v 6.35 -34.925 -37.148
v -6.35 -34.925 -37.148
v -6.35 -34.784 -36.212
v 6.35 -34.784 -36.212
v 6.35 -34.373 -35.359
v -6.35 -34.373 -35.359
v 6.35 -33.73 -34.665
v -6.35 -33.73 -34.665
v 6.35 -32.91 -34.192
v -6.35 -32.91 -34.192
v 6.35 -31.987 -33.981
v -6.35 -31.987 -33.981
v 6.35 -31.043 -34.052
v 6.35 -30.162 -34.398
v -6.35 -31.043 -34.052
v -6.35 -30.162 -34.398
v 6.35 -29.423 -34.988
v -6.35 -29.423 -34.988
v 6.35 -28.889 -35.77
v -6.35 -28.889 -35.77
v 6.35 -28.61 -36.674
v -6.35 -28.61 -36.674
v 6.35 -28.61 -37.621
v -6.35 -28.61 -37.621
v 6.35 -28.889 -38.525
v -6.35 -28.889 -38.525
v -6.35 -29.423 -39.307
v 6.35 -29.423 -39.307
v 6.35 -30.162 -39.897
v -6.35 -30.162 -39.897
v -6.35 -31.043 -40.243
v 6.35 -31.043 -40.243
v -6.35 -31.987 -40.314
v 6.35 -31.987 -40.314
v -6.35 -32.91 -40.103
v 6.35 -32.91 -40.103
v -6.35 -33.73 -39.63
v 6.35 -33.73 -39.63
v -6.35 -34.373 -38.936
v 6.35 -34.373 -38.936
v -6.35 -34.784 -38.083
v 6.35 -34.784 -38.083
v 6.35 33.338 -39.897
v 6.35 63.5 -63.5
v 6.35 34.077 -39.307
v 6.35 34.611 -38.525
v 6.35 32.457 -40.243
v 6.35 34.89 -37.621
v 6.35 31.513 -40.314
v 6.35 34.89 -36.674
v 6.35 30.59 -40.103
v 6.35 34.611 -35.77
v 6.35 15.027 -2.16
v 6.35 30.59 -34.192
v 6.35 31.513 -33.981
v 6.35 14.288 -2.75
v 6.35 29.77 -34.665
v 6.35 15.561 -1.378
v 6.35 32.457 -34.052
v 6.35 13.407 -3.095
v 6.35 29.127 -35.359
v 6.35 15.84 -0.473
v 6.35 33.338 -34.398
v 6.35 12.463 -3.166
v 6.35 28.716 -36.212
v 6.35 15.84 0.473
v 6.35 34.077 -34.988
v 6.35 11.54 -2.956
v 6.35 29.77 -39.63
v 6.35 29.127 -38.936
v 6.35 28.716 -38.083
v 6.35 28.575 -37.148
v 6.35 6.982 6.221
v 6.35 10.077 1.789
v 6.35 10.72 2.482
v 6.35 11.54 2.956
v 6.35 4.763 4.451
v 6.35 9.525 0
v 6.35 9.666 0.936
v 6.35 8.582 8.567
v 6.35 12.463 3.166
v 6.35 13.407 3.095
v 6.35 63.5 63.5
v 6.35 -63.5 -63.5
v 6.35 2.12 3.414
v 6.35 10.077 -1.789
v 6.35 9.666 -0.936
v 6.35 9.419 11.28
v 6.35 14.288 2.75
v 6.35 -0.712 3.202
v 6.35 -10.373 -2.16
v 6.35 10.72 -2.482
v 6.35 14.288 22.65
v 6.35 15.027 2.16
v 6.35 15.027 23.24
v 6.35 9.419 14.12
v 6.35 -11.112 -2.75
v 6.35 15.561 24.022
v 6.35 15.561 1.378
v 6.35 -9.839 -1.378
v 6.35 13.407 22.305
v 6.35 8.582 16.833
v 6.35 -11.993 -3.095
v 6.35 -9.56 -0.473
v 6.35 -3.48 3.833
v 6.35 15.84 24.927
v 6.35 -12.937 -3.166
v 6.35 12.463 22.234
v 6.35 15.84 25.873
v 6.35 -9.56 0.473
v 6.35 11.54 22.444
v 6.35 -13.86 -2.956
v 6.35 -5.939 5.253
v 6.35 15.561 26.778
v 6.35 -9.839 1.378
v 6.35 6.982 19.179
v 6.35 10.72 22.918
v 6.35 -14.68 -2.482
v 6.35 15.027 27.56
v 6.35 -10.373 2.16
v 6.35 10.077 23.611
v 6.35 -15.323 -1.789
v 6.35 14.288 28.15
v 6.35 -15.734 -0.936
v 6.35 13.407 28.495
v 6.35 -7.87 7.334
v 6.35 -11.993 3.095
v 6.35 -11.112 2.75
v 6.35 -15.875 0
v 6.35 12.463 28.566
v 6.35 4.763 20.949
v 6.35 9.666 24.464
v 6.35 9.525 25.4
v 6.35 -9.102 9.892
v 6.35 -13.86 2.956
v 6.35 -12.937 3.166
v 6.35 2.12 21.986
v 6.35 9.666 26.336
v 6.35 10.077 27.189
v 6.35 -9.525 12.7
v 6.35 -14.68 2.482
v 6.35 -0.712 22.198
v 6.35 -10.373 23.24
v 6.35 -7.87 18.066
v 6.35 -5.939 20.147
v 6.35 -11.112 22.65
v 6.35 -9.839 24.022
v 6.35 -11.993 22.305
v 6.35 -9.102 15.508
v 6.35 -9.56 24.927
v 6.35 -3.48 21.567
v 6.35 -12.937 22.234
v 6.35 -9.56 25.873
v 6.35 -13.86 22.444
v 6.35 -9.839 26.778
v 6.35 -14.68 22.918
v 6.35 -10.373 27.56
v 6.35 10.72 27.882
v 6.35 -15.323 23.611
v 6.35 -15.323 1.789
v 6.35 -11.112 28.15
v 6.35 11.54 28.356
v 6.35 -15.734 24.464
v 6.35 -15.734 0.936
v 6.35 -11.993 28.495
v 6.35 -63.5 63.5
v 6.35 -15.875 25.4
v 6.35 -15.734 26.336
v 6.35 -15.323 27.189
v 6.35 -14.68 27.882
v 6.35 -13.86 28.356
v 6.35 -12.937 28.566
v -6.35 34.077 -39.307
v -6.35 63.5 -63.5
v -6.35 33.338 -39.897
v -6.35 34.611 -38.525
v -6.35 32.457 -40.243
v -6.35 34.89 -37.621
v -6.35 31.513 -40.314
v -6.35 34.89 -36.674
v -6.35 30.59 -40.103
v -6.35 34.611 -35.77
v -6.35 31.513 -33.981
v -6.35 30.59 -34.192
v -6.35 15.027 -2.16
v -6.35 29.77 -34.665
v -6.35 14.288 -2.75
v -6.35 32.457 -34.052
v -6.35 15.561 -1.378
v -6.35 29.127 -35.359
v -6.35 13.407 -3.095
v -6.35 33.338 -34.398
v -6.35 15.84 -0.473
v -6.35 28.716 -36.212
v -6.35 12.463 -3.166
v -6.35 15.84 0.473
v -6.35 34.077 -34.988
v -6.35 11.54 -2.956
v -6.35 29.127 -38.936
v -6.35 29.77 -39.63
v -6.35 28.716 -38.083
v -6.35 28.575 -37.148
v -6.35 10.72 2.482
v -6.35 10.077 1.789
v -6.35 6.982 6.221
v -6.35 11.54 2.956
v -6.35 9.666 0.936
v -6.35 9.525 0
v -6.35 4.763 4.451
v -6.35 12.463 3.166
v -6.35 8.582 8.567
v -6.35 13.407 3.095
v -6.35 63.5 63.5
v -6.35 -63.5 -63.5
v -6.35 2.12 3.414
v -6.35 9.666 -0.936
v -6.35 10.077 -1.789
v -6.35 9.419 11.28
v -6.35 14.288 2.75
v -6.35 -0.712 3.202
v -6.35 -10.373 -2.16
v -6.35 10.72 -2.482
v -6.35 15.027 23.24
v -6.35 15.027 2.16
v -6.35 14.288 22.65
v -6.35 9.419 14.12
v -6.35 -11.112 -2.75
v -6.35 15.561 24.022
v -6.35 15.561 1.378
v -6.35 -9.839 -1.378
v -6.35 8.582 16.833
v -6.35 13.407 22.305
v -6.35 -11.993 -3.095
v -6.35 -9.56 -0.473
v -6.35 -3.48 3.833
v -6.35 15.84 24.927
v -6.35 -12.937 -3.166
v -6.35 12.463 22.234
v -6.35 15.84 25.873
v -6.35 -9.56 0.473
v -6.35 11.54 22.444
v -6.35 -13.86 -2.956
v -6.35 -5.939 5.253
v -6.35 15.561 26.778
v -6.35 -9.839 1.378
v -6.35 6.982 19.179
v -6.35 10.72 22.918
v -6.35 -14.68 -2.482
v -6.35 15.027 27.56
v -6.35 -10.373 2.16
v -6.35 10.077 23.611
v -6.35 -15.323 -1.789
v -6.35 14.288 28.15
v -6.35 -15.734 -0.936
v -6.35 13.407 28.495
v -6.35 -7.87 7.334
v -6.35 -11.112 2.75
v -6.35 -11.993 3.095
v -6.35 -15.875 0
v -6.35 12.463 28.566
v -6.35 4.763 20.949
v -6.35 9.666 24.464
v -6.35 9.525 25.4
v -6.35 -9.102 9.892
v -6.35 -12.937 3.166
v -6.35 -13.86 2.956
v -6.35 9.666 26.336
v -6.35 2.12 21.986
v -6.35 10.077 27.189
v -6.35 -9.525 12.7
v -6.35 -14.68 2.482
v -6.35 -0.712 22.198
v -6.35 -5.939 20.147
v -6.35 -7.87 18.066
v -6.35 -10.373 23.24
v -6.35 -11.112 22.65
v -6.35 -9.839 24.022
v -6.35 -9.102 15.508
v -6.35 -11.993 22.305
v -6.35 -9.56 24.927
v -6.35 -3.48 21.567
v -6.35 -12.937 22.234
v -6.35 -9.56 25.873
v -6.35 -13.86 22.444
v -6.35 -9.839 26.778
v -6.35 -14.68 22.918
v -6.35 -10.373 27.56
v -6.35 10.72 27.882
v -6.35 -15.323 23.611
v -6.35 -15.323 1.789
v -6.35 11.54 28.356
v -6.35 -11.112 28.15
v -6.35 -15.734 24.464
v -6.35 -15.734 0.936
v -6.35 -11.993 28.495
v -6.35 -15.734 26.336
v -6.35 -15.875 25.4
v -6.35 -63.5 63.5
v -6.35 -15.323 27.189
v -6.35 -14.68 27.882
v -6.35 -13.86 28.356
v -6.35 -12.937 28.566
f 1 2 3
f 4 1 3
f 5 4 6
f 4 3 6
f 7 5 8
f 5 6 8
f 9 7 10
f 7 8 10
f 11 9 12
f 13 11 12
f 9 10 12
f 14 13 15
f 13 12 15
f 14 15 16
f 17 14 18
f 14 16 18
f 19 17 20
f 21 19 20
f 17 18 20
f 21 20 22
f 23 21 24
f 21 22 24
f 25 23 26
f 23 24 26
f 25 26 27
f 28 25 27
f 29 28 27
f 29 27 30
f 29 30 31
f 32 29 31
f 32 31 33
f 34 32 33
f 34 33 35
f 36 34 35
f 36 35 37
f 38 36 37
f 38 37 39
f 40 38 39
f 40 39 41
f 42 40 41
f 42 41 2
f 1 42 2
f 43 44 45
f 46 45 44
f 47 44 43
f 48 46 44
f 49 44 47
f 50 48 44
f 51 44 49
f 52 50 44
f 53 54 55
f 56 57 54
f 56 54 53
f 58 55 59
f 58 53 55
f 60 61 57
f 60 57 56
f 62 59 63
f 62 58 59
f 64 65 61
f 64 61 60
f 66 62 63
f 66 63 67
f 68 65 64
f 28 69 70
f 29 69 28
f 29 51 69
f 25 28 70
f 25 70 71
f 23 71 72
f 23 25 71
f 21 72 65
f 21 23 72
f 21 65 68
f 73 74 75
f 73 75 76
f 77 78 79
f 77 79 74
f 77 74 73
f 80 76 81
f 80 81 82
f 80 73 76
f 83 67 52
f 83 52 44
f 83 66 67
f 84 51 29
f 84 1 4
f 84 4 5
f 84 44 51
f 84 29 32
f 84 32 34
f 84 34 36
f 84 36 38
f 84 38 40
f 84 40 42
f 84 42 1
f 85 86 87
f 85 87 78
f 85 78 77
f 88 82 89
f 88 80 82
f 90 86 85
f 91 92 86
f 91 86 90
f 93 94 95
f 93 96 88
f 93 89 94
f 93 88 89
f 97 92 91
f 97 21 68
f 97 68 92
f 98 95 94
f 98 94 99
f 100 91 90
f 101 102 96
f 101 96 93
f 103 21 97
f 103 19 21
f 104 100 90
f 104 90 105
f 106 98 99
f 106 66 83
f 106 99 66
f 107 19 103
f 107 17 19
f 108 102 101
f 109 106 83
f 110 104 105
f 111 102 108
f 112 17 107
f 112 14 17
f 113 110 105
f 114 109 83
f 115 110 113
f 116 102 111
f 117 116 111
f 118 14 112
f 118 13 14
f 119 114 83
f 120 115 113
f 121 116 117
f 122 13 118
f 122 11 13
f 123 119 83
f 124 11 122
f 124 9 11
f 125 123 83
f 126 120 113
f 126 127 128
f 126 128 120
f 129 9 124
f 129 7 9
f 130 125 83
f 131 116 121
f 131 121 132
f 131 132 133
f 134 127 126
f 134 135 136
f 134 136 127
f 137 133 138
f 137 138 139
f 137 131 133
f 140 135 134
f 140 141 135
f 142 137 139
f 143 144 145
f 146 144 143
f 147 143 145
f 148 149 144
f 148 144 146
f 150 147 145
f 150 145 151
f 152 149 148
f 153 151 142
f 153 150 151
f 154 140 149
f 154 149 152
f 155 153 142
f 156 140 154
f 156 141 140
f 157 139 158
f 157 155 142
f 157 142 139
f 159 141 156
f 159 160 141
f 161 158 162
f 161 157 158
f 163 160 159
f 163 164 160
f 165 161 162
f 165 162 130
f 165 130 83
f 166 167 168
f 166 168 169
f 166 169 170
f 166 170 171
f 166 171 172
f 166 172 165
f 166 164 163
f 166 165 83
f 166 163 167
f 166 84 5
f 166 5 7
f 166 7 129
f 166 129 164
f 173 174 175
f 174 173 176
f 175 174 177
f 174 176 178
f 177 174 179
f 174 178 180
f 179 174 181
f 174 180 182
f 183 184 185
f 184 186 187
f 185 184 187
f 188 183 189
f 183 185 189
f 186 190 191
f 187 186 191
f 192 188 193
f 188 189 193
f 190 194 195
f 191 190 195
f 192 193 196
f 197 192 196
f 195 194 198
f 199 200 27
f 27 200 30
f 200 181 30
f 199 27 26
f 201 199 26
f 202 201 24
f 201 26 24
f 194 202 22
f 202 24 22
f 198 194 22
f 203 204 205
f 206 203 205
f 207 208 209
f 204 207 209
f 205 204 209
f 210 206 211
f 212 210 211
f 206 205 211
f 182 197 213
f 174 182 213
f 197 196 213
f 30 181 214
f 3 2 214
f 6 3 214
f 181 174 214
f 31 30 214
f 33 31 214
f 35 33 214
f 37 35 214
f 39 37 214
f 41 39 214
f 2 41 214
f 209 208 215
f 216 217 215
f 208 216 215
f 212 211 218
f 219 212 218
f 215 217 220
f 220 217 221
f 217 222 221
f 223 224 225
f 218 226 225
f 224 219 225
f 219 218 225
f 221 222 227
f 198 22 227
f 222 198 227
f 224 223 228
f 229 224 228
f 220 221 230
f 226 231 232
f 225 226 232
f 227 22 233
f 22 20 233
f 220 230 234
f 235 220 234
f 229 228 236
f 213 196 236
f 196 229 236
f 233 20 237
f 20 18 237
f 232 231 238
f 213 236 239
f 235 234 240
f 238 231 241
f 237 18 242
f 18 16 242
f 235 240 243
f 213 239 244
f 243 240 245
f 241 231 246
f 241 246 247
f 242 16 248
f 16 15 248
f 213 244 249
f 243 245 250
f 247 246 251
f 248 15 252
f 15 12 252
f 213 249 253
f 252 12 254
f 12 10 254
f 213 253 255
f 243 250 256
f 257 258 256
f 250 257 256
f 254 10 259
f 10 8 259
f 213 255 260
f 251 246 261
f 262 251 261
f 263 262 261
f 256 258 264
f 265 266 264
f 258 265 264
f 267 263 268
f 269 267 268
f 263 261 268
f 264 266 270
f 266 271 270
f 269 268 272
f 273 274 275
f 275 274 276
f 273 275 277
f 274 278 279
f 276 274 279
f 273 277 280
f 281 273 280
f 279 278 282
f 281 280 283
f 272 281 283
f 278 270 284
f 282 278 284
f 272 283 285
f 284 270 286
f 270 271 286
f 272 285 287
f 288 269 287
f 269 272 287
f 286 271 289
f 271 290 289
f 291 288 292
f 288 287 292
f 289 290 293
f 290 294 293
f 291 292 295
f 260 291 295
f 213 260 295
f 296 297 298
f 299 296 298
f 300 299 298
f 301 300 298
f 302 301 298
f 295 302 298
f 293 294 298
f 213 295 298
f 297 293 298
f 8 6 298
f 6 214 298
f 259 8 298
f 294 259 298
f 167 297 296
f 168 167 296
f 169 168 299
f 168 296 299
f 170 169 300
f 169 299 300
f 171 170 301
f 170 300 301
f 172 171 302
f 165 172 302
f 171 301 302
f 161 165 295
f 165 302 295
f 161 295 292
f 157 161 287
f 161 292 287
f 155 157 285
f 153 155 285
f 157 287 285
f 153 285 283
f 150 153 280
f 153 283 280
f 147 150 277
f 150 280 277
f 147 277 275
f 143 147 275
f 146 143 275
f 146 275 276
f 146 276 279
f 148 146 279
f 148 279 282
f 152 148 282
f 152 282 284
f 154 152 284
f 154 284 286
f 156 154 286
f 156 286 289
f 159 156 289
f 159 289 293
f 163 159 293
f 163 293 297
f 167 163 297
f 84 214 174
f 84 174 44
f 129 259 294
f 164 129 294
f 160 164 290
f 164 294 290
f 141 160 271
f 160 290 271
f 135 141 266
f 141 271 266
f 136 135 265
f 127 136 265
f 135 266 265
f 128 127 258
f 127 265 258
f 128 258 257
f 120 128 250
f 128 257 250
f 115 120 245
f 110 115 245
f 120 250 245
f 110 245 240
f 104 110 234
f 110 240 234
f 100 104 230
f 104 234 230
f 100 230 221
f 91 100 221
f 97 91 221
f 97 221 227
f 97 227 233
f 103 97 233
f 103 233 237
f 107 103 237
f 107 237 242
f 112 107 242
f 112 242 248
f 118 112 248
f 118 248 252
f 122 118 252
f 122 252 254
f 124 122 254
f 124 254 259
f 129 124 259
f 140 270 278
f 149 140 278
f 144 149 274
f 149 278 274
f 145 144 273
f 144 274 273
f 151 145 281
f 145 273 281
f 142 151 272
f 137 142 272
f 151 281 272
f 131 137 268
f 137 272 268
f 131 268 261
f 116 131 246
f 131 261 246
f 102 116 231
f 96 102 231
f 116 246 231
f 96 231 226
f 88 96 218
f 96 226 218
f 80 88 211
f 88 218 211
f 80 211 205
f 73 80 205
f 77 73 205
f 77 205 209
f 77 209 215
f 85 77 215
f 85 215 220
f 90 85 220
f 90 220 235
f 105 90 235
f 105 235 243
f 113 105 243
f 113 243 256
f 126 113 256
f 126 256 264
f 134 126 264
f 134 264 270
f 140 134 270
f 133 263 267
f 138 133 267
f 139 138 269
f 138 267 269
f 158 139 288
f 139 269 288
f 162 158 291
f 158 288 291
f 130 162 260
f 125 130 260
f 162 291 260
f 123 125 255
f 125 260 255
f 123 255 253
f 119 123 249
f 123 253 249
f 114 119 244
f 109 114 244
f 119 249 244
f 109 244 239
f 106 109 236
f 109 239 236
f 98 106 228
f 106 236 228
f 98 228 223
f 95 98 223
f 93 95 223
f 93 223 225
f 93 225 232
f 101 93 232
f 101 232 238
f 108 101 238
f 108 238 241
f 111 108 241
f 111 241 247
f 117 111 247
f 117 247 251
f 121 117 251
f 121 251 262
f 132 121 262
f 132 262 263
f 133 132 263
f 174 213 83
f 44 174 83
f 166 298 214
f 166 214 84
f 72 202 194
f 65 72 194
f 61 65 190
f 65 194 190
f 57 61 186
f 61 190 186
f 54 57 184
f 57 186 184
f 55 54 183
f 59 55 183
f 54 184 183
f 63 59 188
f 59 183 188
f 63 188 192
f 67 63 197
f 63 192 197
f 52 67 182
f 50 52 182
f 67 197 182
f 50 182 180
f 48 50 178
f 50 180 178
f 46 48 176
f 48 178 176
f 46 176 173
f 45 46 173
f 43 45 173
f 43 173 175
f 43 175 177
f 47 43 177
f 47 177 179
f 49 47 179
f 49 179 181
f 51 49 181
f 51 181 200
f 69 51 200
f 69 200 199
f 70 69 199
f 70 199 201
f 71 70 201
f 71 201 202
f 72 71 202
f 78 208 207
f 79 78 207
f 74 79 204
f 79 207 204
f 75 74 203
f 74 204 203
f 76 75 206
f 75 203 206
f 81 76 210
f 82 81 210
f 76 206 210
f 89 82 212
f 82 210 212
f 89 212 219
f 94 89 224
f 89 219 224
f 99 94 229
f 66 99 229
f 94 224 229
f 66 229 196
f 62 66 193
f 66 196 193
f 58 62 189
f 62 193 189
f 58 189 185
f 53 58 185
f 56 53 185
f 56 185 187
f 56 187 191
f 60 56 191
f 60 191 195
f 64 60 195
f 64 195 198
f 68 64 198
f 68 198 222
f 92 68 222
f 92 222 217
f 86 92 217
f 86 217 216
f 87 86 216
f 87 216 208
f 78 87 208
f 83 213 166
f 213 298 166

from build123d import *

# Parameters (mm, degrees)
F0_W     = 12.7
F0_H     = 127
F1_DEPTH = 63.5
F2_R     = 9.525
F2_R_2   = 3.175
F3_DEPTH = 12.701


with BuildPart() as f1:
    # F0 (on Front) → F1 (new body, symmetric)
    with BuildSketch(Plane.XZ):
        Rectangle(F0_W, F0_H)
    extrude(amount=F1_DEPTH, both=True)

    # F2 (on face) → F3 (cut, through all)
    with BuildSketch(Plane(origin=(-6.35, 0, 0), x_dir=(0, -1, 0), z_dir=(-1, 0, 0))):
        with Locations((0, 12.7)):
            Circle(F2_R)
        with Locations((-12.7, 25.4)):
            Circle(F2_R_2)
        with Locations((-12.7, 0)):
            Circle(F2_R_2)
        with Locations((12.7, 0)):
            Circle(F2_R_2)
        with Locations((12.7, 25.4)):
            Circle(F2_R_2)
        with Locations((-31.75, -37.1475)):
            Circle(F2_R_2)
        with Locations((31.75, -37.1475)):
            Circle(F2_R_2)
    extrude(amount=-F3_DEPTH, mode=Mode.SUBTRACT)


solid = f1.part
